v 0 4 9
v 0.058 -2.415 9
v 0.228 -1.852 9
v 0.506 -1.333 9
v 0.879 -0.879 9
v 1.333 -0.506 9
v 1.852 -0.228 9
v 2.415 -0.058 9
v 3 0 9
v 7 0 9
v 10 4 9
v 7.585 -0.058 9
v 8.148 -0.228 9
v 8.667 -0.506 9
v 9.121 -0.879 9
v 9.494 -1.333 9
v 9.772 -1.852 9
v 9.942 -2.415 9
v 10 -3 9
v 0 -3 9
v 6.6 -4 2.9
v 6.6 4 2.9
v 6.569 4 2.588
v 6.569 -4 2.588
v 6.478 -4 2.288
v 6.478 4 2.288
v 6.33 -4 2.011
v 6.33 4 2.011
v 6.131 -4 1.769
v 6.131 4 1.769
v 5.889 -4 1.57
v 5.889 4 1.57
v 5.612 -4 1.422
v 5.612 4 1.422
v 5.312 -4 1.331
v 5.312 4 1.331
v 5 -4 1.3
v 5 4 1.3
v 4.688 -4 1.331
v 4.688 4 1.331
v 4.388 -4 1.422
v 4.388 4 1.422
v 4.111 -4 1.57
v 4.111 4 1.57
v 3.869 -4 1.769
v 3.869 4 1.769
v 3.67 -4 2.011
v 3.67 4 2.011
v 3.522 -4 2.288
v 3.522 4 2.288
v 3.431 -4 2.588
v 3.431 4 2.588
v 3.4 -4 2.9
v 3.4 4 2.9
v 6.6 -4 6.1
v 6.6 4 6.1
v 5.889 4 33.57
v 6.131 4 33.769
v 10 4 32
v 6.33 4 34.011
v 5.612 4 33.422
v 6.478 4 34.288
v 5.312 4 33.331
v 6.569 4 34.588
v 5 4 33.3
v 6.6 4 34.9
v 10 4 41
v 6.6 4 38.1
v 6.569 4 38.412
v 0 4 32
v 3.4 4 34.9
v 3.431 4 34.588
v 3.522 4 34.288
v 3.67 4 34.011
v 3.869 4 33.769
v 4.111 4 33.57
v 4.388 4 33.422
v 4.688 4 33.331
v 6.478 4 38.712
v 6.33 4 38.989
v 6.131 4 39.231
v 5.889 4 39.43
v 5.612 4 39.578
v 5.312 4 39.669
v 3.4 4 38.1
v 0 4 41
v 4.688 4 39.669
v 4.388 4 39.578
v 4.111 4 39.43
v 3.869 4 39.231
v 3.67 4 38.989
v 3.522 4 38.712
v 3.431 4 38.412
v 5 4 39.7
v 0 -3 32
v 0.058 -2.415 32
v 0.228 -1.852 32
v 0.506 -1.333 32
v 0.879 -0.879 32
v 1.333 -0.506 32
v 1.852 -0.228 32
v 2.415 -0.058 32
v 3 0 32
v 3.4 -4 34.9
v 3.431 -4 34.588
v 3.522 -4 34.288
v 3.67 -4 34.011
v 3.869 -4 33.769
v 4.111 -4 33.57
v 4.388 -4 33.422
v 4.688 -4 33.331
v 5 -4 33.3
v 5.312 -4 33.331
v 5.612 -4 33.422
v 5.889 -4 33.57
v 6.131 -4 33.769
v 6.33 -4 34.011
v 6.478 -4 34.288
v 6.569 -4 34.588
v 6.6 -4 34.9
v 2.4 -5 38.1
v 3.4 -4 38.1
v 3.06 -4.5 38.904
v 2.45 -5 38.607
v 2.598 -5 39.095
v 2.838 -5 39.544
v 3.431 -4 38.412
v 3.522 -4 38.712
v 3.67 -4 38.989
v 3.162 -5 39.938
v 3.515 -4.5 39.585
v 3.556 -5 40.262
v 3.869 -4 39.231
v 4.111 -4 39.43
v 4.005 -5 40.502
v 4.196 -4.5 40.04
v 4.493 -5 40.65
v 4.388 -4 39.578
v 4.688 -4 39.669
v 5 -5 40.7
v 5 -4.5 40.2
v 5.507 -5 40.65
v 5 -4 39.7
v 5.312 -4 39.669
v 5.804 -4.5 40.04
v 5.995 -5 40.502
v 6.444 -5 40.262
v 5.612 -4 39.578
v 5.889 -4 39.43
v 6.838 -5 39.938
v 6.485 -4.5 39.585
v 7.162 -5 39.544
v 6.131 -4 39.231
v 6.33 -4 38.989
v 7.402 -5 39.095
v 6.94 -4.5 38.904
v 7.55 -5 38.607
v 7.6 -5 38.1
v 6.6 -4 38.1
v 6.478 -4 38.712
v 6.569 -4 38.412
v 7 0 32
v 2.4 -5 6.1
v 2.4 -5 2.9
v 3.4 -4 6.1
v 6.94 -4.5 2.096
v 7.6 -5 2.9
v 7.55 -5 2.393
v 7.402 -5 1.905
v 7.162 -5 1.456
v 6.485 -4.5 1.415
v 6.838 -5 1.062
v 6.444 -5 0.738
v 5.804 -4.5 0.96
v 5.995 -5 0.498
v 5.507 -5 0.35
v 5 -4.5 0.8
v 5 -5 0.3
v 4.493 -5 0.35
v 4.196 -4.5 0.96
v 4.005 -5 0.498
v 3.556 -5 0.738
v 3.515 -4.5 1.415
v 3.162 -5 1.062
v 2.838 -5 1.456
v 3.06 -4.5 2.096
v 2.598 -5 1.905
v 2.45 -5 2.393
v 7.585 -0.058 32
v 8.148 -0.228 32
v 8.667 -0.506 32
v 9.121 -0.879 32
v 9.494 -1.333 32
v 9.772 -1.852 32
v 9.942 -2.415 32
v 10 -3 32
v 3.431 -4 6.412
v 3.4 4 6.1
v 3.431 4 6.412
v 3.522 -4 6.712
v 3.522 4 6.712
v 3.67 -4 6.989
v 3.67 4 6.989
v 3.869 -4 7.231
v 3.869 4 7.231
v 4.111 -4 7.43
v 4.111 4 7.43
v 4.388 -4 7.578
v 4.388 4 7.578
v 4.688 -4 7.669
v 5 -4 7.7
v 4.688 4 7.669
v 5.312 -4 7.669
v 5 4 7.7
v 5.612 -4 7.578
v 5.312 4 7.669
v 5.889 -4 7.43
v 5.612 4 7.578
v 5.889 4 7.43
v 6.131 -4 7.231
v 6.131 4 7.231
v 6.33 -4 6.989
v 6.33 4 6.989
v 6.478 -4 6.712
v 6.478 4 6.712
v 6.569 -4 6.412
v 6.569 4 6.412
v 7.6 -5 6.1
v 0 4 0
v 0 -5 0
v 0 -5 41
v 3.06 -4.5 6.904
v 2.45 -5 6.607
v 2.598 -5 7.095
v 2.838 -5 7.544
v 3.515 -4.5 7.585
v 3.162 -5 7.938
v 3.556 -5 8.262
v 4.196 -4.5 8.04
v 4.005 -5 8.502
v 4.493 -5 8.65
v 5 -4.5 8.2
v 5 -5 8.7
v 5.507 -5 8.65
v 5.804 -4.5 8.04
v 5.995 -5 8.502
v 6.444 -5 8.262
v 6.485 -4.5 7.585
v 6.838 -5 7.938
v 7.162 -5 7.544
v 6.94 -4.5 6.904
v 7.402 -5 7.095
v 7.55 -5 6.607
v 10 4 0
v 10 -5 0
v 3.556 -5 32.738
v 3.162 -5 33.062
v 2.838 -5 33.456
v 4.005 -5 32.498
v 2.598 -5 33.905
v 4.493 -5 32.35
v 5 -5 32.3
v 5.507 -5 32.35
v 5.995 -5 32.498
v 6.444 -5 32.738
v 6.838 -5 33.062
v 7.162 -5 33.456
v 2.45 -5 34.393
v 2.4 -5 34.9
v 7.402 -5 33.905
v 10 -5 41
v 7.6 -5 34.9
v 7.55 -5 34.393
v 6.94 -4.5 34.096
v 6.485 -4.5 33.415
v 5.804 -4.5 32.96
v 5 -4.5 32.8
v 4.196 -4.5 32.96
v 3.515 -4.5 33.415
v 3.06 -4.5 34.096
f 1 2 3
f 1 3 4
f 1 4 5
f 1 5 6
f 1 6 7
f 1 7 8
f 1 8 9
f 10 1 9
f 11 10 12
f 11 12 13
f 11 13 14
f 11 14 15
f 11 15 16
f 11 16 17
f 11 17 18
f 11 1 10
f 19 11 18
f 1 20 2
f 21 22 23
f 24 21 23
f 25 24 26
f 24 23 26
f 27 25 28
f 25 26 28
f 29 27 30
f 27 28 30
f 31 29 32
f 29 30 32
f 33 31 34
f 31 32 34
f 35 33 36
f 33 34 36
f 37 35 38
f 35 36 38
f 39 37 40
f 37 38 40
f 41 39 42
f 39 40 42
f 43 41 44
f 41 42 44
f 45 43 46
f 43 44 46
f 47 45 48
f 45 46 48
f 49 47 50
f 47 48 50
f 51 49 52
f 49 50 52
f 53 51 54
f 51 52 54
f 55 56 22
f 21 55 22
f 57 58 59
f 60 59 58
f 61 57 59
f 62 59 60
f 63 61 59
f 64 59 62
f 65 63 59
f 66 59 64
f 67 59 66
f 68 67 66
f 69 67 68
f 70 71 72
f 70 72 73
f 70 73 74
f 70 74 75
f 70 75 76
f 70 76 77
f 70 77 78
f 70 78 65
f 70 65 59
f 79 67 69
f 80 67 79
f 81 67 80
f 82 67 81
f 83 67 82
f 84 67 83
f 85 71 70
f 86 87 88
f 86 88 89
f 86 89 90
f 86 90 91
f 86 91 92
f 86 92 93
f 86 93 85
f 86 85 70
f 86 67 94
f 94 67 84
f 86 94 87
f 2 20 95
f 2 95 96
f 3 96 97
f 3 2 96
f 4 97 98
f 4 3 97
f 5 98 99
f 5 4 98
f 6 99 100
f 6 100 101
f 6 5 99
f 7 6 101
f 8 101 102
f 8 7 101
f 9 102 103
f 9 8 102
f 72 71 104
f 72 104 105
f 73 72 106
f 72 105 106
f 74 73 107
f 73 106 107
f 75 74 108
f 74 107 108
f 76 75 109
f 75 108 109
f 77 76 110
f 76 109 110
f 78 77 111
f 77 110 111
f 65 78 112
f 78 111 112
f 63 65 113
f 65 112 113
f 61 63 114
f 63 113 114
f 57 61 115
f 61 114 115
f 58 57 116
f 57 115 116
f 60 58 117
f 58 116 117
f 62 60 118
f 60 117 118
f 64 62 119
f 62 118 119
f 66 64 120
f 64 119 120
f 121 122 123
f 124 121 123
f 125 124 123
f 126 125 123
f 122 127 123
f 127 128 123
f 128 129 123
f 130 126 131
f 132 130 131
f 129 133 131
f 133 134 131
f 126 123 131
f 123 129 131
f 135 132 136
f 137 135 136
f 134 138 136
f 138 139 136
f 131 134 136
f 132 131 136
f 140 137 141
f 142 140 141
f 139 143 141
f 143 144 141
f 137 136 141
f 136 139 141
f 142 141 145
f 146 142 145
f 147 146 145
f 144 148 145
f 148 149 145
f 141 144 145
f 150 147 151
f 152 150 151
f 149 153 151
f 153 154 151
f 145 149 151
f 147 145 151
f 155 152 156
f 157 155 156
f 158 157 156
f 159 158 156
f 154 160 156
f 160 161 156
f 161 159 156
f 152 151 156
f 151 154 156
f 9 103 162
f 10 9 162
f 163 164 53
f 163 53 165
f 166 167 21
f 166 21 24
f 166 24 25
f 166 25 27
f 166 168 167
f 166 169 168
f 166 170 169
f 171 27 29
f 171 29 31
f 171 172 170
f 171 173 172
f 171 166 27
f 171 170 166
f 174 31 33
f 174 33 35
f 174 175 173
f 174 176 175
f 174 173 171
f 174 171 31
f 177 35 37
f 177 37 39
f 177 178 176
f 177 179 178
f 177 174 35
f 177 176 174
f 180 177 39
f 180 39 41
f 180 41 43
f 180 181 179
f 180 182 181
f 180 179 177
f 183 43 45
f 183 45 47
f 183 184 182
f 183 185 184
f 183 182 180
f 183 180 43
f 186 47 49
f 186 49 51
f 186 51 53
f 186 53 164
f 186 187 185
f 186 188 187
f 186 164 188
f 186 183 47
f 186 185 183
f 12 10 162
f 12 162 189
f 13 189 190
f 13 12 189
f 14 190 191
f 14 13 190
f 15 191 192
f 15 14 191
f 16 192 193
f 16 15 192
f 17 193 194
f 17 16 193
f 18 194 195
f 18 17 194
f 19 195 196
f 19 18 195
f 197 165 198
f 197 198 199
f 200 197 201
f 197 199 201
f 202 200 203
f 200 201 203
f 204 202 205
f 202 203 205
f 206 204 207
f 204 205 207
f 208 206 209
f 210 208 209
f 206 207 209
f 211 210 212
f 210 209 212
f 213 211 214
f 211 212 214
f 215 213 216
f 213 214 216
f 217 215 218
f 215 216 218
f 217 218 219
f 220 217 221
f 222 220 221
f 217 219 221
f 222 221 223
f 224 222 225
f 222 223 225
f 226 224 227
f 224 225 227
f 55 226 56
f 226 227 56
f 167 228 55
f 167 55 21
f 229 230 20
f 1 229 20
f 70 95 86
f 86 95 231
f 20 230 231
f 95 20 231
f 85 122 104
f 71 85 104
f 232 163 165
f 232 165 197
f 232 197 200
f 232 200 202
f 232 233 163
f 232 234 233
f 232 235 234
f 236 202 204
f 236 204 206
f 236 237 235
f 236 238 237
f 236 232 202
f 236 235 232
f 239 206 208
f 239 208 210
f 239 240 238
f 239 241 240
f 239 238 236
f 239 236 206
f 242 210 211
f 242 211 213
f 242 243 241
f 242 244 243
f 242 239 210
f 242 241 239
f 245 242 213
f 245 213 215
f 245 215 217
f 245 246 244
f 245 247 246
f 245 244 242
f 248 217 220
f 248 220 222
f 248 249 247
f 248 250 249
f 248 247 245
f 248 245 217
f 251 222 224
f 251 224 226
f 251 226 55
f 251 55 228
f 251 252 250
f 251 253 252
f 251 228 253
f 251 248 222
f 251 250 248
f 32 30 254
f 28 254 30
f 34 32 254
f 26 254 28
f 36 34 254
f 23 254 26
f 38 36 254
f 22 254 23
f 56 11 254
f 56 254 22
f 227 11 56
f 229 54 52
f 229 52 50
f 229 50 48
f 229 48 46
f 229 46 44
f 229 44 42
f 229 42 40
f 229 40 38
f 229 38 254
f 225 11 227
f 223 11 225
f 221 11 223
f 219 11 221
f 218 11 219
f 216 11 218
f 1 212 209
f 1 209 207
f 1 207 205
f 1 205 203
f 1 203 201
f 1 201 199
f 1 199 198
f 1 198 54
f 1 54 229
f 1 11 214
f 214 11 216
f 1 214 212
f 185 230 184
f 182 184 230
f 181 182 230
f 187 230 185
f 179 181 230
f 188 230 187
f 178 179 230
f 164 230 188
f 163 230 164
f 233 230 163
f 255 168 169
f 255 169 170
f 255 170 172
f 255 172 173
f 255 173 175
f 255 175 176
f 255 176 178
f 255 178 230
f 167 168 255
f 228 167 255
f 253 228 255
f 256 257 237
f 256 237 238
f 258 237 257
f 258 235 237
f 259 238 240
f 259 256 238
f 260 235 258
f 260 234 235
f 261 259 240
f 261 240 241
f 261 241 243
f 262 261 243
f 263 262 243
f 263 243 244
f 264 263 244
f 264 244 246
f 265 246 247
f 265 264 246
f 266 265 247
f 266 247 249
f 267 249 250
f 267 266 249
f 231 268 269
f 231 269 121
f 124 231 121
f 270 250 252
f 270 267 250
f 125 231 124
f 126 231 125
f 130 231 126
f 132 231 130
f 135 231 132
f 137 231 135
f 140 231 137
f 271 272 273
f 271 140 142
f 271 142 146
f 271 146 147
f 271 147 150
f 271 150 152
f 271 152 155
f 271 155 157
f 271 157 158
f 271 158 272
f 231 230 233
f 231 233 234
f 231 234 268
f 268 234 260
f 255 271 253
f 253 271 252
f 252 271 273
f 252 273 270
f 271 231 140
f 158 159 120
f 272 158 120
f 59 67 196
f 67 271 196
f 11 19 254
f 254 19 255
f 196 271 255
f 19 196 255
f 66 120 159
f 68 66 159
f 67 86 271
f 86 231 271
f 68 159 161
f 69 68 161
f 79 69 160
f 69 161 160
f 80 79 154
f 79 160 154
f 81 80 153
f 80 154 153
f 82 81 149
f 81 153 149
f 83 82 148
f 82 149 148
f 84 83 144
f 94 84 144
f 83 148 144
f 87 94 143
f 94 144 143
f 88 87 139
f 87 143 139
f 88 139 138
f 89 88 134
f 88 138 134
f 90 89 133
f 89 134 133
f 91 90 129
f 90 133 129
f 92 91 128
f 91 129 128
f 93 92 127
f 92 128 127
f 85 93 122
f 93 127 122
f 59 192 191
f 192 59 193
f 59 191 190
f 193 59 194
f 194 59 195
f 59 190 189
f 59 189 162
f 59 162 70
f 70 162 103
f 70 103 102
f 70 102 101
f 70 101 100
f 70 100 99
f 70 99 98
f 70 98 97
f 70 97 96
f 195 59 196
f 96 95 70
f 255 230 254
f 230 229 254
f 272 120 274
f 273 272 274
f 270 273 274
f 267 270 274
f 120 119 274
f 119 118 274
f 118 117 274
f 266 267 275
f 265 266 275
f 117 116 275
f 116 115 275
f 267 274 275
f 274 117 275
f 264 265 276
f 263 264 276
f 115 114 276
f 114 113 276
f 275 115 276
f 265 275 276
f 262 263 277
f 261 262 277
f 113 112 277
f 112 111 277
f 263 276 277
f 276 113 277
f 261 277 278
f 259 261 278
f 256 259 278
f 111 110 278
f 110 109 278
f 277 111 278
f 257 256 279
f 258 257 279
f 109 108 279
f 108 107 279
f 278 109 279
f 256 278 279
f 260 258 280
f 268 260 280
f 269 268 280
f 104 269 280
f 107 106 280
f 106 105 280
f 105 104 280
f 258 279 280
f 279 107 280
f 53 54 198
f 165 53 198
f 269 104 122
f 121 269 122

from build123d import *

# Parameters (mm, degrees)
F0_W     = 10
F0_H     = 41
F1_DEPTH = 5
F4_DEPTH = 23
F6_DEPTH = 4
F7_SIZE  = 1


with BuildPart() as f1:
    # F0 (on Front) → F1 (new body)
    with BuildSketch(Plane.XZ):
        with Locations((5, 20.5)):
            Rectangle(F0_W, F0_H)
        with BuildLine():
            ThreePointArc((3.4, 6.1), (5, 7.7), (6.6, 6.1))
            Line((6.6, 6.1), (6.6, 2.9))
            ThreePointArc((6.6, 2.9), (5, 1.3), (3.4, 2.9))
            Line((3.4, 2.9), (3.4, 6.1))
        make_face(mode=Mode.SUBTRACT)
        with BuildLine():
            ThreePointArc((6.6, 34.9), (5, 33.3), (3.4, 34.9))
            Line((3.4, 34.9), (3.4, 38.1))
            ThreePointArc((3.4, 38.1), (5, 39.7), (6.6, 38.1))
            Line((6.6, 38.1), (6.6, 34.9))
        make_face(mode=Mode.SUBTRACT)
    extrude(amount=F1_DEPTH)

    # F3 (on offset) → F4 (cut)
    with BuildSketch(Plane.XY.offset(9)):
        with BuildLine():
            Line((10, 0), (7, 0))
            ThreePointArc((7, 0), (9.12132, -0.87868), (10, -3))
            Line((10, -3), (10, -2.5))
            Line((10, -2.5), (10, 0))
        make_face()
        with BuildLine():
            ThreePointArc((0, -3), (0.87868, -0.87868), (3, 0))
            Line((3, 0), (0, 0))
            Line((0, 0), (0, -3))
        make_face()
    extrude(amount=F4_DEPTH, mode=Mode.SUBTRACT)

    # F5 (on face) → F6 (join)
    with BuildSketch(Plane(origin=(0, 0, 0), x_dir=(-1, 0, 0), z_dir=(0, 1, 0))):
        Polygon((0, 32), (0, 41), (-10, 41), (-10, 32), (-7, 32), (-3, 32), align=None)
        with BuildLine():
            Line((-6.6, 34.9), (-6.6, 38.1))
            ThreePointArc((-6.6, 38.1), (-5, 39.7), (-3.4, 38.1))
            Line((-3.4, 38.1), (-3.4, 34.9))
            ThreePointArc((-3.4, 34.9), (-5, 33.3), (-6.6, 34.9))
        make_face(mode=Mode.SUBTRACT)
        Polygon((0, 9), (-3, 9), (-7, 9), (-10, 9), (-10, 0), (0, 0), align=None)
        with BuildLine():
            Line((-6.6, 2.9), (-6.6, 6.1))
            ThreePointArc((-6.6, 6.1), (-5, 7.7), (-3.4, 6.1))
            Line((-3.4, 6.1), (-3.4, 2.9))
            ThreePointArc((-3.4, 2.9), (-5, 1.3), (-6.6, 2.9))
        make_face(mode=Mode.SUBTRACT)
    extrude(amount=F6_DEPTH)

    # F7
    f7_edges = [f1.edges().sort_by_distance(p)[0] for p in [
        (5, -5, 33.3),
        (5, -5, 1.3),
    ]]
    chamfer(f7_edges, length=F7_SIZE)


solid = f1.part
